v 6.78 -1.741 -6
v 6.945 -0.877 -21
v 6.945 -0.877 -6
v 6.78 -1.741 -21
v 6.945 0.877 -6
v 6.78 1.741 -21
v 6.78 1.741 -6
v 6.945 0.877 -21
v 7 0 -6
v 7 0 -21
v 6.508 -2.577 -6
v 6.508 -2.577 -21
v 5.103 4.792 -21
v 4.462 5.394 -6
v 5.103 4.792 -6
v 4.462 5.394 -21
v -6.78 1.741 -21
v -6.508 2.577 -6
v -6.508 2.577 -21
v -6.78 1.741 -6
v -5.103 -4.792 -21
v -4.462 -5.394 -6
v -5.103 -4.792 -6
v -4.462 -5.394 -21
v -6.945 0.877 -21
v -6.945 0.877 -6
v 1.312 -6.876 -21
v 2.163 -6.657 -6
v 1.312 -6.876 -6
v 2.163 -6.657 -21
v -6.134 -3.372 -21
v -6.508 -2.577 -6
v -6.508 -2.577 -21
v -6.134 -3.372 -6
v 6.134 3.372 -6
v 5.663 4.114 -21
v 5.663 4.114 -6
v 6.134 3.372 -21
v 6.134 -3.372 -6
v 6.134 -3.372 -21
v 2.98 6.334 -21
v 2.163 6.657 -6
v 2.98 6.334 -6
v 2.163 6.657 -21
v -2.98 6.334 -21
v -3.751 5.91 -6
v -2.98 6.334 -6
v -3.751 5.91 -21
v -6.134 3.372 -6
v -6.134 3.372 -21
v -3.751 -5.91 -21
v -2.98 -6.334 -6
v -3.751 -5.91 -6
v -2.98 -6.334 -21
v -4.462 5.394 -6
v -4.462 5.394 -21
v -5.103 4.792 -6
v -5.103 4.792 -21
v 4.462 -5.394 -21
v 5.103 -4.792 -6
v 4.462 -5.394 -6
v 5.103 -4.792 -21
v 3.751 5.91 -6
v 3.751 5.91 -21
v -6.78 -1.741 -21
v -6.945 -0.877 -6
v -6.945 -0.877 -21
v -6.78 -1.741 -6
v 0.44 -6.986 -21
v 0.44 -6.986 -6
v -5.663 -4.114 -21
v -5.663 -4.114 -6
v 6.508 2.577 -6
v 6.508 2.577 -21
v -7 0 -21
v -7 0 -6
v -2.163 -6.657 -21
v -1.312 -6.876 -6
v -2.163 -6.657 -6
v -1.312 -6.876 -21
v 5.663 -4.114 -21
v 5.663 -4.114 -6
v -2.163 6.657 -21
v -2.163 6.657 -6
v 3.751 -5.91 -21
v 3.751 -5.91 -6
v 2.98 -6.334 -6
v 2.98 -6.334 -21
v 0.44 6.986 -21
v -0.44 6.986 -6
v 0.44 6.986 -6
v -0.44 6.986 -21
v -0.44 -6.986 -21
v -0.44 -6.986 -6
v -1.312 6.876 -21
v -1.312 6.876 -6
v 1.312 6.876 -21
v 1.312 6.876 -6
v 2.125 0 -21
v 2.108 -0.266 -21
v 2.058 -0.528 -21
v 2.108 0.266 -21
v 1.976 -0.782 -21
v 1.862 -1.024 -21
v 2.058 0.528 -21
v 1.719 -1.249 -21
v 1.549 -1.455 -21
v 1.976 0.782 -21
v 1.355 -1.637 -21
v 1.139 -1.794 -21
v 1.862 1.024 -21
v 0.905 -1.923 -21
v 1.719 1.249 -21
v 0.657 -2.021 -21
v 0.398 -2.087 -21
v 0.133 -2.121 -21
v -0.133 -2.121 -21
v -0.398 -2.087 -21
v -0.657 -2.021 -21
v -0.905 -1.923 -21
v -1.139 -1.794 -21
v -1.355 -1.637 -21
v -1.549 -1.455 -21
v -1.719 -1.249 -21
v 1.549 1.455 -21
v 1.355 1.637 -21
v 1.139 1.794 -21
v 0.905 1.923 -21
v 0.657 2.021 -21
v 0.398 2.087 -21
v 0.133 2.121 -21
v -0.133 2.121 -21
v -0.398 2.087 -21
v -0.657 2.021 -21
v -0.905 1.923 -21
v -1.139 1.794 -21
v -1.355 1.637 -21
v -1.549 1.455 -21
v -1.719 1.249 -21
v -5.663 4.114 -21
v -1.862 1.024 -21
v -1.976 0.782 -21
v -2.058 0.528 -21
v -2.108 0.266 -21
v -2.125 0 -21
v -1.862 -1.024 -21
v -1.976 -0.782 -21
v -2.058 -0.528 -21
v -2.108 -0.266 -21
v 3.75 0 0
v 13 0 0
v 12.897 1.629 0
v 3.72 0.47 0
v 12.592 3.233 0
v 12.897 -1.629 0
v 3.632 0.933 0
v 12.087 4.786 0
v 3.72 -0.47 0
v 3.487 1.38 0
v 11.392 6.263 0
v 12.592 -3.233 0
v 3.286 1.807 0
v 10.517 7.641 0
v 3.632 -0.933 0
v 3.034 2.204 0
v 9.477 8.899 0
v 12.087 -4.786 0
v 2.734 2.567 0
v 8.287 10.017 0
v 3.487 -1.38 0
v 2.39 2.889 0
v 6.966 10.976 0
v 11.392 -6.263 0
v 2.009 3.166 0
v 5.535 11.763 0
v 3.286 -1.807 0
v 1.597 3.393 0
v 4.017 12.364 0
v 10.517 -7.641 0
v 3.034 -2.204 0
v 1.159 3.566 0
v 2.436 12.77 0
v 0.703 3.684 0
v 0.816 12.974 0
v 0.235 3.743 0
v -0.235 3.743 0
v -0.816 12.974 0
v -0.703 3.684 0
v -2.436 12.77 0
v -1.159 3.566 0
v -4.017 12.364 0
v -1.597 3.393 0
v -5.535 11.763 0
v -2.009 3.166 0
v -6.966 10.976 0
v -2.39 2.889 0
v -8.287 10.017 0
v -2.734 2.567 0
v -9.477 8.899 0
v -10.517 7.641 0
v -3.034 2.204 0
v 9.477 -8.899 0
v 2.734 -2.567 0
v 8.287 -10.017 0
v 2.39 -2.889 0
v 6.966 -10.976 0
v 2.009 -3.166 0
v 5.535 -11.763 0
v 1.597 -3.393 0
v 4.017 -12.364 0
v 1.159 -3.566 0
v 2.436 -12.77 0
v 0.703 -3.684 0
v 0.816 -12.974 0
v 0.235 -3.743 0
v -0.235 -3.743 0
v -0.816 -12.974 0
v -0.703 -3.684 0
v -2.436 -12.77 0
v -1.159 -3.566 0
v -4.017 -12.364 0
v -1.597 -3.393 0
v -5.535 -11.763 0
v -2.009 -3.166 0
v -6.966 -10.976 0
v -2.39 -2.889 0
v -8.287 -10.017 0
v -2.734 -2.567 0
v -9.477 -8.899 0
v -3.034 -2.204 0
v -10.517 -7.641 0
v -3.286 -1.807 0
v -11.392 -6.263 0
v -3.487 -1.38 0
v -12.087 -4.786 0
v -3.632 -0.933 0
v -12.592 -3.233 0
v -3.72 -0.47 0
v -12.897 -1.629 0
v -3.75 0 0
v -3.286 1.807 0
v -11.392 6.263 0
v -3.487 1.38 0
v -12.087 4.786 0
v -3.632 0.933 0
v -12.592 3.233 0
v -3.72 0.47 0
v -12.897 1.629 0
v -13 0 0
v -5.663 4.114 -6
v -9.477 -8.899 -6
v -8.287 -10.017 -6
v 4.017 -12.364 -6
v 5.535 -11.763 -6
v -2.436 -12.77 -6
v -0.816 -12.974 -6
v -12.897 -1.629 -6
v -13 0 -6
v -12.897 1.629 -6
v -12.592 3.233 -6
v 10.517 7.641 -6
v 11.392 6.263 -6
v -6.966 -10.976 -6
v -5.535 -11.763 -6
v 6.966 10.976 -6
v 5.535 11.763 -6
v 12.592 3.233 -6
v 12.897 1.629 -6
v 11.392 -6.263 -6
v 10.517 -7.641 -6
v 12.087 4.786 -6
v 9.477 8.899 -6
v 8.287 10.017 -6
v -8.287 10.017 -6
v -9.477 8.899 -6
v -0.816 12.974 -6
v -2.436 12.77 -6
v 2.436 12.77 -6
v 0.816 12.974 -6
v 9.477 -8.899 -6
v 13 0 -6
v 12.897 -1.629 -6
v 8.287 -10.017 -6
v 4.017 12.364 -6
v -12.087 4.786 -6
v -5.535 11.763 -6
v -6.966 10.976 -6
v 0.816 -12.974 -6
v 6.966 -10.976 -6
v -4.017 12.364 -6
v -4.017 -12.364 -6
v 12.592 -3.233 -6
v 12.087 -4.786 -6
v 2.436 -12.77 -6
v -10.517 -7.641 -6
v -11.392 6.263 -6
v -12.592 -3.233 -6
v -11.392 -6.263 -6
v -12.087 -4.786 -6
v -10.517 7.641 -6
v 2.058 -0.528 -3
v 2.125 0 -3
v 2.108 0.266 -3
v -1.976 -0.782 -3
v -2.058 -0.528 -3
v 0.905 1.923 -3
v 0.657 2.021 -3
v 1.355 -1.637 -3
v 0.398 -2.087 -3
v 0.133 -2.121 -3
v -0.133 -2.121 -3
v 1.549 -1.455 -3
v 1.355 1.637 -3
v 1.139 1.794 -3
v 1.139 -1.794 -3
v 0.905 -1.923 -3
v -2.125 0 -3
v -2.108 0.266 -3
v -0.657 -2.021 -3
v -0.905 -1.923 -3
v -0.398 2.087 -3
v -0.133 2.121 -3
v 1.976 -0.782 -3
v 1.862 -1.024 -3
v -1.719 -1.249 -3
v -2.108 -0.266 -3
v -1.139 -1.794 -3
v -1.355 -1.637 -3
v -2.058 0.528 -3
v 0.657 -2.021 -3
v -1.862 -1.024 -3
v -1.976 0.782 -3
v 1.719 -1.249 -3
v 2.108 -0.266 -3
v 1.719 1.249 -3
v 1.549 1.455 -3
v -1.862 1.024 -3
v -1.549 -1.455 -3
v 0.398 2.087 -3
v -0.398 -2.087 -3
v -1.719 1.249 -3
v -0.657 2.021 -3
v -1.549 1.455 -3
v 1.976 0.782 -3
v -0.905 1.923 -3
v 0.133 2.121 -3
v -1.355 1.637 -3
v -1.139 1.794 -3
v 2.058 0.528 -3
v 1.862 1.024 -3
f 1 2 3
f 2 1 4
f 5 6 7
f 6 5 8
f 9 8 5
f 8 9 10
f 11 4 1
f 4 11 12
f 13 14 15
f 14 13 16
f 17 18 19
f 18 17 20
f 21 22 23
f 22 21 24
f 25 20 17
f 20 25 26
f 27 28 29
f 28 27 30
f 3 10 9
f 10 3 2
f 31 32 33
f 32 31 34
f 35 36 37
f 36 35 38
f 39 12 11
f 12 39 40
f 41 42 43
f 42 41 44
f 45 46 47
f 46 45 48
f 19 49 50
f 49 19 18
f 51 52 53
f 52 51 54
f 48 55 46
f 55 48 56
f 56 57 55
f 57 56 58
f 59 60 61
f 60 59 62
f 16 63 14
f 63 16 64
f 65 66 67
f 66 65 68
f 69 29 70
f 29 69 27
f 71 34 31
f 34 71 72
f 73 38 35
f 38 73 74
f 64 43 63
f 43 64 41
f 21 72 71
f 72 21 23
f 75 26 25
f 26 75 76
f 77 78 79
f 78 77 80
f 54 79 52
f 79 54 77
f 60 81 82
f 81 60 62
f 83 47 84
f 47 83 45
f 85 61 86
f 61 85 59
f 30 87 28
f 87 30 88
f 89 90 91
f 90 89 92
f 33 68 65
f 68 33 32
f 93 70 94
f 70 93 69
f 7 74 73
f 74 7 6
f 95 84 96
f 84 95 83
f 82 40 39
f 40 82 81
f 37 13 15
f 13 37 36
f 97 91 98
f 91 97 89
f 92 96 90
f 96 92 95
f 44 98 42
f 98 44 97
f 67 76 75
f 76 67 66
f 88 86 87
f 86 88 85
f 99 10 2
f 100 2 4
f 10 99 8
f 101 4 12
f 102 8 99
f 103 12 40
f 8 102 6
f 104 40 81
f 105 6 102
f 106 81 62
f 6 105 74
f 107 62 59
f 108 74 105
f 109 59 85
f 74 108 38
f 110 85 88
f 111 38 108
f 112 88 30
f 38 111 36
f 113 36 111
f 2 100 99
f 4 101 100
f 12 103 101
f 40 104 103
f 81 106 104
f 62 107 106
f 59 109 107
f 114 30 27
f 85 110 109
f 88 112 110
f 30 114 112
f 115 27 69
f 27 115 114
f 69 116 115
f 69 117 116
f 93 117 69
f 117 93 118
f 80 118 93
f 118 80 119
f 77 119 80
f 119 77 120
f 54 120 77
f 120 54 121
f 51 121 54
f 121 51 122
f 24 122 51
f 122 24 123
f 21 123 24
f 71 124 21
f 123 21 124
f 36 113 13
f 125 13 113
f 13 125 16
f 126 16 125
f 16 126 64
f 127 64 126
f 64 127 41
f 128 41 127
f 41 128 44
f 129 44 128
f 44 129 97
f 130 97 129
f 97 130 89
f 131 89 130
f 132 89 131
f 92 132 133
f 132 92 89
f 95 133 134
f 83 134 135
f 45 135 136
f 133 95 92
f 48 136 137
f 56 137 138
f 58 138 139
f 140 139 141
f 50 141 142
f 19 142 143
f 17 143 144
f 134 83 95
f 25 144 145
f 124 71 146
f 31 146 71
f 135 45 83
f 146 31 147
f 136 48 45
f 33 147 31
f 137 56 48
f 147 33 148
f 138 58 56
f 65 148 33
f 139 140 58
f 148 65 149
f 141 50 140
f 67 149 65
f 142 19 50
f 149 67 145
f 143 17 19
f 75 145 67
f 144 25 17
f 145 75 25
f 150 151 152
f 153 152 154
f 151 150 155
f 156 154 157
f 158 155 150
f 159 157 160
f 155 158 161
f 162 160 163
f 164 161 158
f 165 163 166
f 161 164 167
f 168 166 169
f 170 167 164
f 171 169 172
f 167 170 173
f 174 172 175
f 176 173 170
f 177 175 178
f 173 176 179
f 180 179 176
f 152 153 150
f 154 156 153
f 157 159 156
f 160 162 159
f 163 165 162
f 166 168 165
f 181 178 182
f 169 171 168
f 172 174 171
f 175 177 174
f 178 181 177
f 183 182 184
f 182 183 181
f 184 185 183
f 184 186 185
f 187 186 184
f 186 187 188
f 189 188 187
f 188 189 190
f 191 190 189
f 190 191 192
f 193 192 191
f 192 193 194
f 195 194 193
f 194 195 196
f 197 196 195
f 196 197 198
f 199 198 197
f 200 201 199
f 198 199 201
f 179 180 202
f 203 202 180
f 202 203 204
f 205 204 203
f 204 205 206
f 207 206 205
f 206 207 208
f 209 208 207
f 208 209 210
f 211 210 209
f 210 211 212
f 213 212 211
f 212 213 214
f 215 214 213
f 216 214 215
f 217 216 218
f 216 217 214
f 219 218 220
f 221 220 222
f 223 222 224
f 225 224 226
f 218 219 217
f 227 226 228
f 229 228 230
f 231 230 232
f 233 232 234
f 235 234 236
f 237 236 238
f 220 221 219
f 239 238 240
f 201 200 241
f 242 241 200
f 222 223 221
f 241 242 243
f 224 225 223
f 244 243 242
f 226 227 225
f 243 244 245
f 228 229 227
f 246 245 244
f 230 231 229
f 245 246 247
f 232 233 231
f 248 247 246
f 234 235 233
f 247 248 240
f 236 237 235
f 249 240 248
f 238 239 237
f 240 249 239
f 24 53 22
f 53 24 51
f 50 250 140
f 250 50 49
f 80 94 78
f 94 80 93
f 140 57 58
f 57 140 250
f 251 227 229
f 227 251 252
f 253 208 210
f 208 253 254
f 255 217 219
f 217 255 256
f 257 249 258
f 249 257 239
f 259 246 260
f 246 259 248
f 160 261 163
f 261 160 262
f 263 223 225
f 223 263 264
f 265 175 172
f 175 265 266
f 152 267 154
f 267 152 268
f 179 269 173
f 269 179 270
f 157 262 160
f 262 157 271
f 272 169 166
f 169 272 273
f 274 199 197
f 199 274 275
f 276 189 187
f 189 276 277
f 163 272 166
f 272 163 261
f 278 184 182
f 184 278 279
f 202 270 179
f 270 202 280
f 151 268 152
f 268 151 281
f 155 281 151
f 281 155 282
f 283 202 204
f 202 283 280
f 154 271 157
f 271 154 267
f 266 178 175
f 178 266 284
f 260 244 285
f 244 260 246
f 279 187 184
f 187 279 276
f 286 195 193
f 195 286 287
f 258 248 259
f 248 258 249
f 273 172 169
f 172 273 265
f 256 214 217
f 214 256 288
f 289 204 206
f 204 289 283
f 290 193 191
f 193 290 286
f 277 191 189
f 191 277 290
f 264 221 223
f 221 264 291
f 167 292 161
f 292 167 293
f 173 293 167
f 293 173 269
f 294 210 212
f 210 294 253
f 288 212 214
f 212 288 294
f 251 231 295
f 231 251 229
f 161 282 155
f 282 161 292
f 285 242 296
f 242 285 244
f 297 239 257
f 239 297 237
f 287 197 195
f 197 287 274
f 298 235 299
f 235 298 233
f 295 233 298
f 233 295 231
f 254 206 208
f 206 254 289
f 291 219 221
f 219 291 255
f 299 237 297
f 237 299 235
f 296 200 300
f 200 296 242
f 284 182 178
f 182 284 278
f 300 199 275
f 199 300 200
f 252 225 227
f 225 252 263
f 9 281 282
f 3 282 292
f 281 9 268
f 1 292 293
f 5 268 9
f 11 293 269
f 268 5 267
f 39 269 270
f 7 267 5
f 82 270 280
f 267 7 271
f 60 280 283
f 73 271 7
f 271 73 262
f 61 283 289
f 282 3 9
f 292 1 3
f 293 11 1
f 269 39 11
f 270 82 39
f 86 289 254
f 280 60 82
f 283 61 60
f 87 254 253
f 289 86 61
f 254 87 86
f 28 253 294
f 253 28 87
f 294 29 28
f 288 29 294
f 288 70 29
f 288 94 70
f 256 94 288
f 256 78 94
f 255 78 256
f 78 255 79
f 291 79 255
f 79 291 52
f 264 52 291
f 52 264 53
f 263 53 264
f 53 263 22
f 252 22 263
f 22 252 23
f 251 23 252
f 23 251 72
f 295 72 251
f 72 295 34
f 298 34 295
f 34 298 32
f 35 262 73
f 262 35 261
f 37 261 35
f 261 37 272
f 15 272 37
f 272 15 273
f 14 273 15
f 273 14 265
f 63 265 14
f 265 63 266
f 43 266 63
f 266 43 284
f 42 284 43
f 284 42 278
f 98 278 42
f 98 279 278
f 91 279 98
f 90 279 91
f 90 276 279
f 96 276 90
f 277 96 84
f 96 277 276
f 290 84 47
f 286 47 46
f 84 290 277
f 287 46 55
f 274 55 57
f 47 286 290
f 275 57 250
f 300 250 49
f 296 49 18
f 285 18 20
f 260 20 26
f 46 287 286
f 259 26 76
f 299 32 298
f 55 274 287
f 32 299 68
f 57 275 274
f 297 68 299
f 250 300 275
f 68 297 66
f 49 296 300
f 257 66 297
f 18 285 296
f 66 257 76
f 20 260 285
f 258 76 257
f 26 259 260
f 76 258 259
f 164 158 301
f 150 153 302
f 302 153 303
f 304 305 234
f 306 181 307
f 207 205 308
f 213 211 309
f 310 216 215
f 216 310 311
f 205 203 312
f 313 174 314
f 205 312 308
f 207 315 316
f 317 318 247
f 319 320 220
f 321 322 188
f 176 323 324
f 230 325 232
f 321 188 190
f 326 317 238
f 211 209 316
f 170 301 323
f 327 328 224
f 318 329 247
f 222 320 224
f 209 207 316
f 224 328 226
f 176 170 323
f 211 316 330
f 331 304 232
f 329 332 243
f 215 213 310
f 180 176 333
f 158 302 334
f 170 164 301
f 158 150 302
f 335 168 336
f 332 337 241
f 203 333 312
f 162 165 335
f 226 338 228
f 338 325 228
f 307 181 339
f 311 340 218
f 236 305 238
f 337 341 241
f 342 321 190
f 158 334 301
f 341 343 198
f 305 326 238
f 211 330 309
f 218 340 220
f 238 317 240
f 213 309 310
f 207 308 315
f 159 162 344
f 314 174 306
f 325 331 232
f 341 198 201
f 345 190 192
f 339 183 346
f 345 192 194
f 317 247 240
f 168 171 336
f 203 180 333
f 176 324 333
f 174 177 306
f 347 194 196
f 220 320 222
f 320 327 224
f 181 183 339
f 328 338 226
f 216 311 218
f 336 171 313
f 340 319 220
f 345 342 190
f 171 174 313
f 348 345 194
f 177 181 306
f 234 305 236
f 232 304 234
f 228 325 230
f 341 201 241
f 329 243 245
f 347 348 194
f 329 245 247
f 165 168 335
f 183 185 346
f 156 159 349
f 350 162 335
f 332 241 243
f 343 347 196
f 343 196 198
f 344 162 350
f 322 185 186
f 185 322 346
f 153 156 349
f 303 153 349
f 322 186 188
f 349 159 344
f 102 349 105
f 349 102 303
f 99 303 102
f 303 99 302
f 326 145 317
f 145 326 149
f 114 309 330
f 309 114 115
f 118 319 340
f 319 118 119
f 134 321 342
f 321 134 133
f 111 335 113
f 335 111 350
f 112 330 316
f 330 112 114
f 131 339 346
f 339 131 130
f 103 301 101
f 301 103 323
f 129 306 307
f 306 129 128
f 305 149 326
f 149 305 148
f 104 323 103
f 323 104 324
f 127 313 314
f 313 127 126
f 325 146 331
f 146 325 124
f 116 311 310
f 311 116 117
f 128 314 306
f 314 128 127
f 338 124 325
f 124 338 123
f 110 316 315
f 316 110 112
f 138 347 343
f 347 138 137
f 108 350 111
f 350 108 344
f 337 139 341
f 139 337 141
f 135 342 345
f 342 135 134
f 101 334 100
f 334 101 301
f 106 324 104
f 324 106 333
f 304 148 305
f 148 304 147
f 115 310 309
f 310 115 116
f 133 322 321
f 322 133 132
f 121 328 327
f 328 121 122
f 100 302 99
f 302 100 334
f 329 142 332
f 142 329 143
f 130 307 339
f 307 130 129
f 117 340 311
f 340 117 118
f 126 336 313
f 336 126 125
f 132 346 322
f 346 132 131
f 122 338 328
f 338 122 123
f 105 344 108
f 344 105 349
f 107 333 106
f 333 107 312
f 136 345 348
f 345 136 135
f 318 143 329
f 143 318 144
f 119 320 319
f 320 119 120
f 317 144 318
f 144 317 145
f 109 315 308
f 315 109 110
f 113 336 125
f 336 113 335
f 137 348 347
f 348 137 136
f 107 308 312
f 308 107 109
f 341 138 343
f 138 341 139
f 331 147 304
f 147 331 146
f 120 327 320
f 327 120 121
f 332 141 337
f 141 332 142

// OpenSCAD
$fn = 50;


difference() {
	union() {
		translate(v = [0, 0, -21.0000000000]) {
			cylinder(h = 21, r = 7.0000000000);
		}
		translate(v = [0, 0, -6.0000000000]) {
			cylinder(h = 6, r = 13.0000000000);
		}
	}
	union() {
		translate(v = [0, 0, 0]) {
			rotate(a = [0, 0, 0]) {
				difference() {
					union() {
						#translate(v = [0, 0, -21.0000000000]) {
							cylinder(h = 21, r = 2.0000000000);
						}
						#translate(v = [0, 0, -3]) {
							cylinder(h = 3, r = 7.0000000000, r1 = 2.1250000000, r2 = 3.7500000000);
						}
						#translate(v = [0, 0, -21.0000000000]) {
							cylinder(h = 21, r = 2.1250000000);
						}
						#translate(v = [0, 0, -21.0000000000]) {
							cylinder(h = 21, r = 2.0000000000);
						}
					}
					union();
				}
			}
		}
	}
}
